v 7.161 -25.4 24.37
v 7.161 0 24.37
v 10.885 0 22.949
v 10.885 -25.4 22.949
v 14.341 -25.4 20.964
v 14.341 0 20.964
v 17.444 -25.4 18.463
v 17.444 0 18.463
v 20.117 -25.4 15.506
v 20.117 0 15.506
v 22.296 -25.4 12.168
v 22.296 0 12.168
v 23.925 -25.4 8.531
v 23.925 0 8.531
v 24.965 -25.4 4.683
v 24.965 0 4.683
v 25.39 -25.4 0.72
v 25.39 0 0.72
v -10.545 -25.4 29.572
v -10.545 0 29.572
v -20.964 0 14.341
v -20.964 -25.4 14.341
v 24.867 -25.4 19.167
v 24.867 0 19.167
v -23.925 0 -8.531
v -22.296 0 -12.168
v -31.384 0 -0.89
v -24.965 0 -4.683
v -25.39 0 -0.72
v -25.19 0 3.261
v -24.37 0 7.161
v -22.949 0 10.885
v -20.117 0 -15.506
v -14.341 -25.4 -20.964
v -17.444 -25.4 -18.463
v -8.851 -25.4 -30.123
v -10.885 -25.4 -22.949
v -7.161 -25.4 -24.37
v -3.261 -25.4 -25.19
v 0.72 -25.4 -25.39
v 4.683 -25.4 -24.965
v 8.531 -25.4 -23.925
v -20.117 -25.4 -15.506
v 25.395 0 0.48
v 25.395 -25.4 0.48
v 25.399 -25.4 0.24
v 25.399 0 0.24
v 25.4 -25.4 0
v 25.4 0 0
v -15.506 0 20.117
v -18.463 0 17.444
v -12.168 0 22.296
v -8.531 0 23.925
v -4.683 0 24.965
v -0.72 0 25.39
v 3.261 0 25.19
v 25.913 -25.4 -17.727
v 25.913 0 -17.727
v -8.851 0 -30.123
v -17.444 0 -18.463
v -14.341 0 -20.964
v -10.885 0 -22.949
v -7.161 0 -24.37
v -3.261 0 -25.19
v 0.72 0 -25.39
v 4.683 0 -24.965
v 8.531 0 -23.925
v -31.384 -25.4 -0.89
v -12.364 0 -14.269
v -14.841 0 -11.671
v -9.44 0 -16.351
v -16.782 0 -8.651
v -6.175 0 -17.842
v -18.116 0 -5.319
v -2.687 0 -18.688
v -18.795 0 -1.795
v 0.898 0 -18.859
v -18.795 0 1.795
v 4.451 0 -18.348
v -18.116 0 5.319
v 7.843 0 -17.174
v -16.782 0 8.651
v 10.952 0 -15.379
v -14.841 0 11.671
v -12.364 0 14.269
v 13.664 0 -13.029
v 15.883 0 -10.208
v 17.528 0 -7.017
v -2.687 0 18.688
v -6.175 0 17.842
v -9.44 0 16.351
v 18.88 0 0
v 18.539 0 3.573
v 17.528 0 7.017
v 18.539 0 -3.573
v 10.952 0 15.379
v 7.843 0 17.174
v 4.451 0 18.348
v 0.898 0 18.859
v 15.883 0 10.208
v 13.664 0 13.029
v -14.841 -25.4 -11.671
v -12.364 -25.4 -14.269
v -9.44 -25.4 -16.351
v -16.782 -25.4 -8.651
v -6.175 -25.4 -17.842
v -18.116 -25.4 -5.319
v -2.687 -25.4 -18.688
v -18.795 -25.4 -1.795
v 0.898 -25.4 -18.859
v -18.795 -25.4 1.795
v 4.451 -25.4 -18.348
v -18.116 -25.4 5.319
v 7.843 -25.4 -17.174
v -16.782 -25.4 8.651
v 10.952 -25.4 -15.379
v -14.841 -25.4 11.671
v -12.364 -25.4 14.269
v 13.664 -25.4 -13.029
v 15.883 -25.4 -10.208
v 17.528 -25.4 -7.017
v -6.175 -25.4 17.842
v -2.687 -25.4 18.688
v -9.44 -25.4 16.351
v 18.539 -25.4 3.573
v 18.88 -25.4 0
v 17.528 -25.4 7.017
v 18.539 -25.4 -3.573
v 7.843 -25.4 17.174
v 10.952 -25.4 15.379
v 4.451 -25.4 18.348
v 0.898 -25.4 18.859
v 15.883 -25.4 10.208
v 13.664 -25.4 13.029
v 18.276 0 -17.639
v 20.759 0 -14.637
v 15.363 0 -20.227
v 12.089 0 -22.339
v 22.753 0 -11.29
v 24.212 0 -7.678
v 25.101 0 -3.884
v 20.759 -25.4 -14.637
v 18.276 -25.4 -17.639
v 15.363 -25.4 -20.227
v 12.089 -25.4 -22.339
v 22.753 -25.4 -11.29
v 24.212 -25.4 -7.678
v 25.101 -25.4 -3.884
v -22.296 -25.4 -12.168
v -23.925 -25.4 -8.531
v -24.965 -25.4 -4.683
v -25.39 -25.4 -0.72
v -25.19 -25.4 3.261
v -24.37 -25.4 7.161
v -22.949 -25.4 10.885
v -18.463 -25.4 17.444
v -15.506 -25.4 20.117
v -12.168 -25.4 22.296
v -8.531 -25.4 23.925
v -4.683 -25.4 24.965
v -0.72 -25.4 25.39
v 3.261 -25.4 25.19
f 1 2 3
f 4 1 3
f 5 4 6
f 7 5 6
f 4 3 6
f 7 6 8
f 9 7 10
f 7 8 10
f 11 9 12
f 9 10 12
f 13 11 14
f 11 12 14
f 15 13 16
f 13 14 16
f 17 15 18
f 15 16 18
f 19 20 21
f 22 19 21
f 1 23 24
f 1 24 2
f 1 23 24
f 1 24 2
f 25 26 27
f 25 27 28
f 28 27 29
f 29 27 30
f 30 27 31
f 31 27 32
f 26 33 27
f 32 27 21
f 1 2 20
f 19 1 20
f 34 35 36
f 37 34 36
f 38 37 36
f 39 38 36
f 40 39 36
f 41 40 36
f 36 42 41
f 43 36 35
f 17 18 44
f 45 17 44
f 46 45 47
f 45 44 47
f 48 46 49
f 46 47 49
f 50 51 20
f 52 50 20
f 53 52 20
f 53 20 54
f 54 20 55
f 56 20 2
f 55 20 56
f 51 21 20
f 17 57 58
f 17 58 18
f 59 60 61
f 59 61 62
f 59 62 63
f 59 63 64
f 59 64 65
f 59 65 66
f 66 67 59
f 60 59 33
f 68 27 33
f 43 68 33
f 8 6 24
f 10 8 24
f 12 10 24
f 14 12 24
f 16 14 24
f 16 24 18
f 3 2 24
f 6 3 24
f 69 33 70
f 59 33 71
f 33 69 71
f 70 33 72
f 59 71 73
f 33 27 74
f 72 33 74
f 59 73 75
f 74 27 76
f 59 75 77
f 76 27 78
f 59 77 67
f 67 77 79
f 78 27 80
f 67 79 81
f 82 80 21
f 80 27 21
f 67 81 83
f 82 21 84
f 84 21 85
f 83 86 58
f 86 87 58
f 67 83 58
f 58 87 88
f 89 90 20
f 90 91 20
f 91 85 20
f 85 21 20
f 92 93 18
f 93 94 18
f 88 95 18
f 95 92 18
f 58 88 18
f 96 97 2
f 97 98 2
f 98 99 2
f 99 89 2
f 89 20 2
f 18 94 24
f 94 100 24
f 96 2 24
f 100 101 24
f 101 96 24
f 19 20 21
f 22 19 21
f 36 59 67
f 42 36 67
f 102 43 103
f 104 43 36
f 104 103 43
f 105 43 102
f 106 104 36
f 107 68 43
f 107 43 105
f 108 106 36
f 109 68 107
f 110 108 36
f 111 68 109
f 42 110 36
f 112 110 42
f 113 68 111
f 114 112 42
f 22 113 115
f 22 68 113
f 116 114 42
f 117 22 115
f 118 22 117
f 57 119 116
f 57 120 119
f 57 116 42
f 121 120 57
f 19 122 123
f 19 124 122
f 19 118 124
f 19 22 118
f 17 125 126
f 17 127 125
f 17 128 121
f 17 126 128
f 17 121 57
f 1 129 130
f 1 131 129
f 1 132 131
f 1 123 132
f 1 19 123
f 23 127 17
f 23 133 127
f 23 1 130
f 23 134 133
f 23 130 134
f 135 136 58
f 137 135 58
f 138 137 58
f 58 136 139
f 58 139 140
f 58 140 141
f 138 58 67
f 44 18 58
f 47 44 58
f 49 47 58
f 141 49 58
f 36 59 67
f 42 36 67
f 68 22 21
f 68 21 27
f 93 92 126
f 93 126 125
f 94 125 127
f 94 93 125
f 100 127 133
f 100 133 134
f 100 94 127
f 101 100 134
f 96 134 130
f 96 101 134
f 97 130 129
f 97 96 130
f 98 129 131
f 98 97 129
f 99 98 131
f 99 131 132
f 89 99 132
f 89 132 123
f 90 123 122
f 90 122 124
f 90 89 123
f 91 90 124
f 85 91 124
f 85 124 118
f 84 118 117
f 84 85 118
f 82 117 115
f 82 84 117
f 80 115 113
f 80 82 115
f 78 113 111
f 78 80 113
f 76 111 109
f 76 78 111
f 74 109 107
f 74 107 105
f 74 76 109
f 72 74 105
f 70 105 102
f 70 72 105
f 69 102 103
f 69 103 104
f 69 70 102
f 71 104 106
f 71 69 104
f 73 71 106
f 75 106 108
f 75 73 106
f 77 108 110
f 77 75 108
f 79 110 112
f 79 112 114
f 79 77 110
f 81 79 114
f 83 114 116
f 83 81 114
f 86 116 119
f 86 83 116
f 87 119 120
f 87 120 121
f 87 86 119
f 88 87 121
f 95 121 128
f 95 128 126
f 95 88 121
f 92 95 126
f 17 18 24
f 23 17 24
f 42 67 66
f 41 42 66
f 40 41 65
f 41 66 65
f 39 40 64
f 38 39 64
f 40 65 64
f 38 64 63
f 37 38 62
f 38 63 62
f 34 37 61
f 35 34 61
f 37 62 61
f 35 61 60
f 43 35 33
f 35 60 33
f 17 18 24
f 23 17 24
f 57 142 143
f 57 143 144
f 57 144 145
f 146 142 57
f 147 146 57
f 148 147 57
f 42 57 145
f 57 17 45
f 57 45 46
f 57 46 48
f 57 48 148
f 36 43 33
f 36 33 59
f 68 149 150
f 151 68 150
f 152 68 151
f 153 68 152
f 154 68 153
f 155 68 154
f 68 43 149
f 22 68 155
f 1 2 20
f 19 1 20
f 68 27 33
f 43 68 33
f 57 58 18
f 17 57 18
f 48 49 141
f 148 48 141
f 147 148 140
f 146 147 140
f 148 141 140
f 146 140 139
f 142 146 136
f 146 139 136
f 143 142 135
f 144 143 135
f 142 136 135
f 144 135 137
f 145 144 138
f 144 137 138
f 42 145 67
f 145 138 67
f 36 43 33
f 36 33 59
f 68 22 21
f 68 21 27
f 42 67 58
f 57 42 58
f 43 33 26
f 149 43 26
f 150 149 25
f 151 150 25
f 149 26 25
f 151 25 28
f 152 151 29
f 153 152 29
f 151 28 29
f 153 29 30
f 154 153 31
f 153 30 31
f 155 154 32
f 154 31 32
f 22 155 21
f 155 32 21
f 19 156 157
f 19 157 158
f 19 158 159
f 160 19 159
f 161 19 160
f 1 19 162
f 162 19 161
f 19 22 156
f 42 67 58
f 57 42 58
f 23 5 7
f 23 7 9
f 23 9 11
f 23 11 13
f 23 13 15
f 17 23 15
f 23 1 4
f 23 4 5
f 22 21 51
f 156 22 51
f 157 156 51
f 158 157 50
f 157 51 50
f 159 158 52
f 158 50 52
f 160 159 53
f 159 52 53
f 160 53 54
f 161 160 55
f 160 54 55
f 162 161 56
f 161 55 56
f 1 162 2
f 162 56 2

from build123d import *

# Parameters (mm, degrees)
F1_DEPTH = 25.4
F0_R     = 18.8803746014
F2_DEPTH = 25.4


with BuildPart() as f1:
    # F0 (on Front) → F1 (new body)
    with BuildSketch(Plane.XZ):
        with BuildLine():
            ThreePointArc((7.1609582992, 24.3696671343), (20.1174678851, 15.5063692041), (25.3897885366, 0.7201653034))
            Line((25.3897885366, 0.7201653034), (24.8665577157, 19.1669265832))
            Line((24.8665577157, 19.1669265832), (7.1609582992, 24.3696671343))
        make_face()
    extrude(amount=F1_DEPTH)


with BuildPart() as f1b:
    # F0 (on Front) → F1, piece 2 (new body)
    with BuildSketch(Plane.XZ):
        with BuildLine():
            ThreePointArc((-20.9640729468, 14.3411173024), (-8.5307940091, 23.9245805308), (7.1609582992, 24.3696671343))
            Line((7.1609582992, 24.3696671343), (-10.5446414986, 29.5724077975))
            Line((-10.5446414986, 29.5724077975), (-20.9640729468, 14.3411173024))
        make_face()
    extrude(amount=F1_DEPTH)


with BuildPart() as f1c:
    # F0 (on Front) → F1, piece 3 (new body)
    with BuildSketch(Plane.XZ):
        with BuildLine():
            Line((-31.383504561, -0.8901734352), (-20.1174677641, -15.506369361))
            ThreePointArc((-20.1174677641, -15.506369361), (-25.3897885345, -0.7201653795), (-20.9640729468, 14.3411173024))
            Line((-20.9640729468, 14.3411173024), (-31.383504561, -0.8901734352))
        make_face()
    extrude(amount=F1_DEPTH)


with BuildPart() as f1d:
    # F0 (on Front) → F1, piece 4 (new body)
    with BuildSketch(Plane.XZ):
        with BuildLine():
            Line((-8.8514310062, -30.1225652363), (8.530796239, -23.9245797357))
            ThreePointArc((8.530796239, -23.9245797357), (-7.1609570405, -24.3696675042), (-20.1174677641, -15.506369361))
            Line((-20.1174677641, -15.506369361), (-8.8514310062, -30.1225652363))
        make_face()
    extrude(amount=F1_DEPTH)


with BuildPart() as f1e:
    # F0 (on Front) → F1, piece 5 (new body)
    with BuildSketch(Plane.XZ):
        with BuildLine():
            ThreePointArc((25.3897885366, 0.7201653034), (25.3974470059, 0.3601188478), (25.4, 0))
            ThreePointArc((25.4, 0), (20.7586394601, -14.6369015766), (8.530796239, -23.9245797357))
            Line((8.530796239, -23.9245797357), (25.91301935, -17.7265957092))
            Line((25.91301935, -17.7265957092), (25.3897885366, 0.7201653034))
        make_face()
    extrude(amount=F1_DEPTH)


with BuildPart() as f2:
    # F0 (on Front) → F2 (new body)
    with BuildSketch(Plane.XZ):
        with BuildLine():
            ThreePointArc((8.530796239, -23.9245797357), (20.7586394601, -14.6369015766), (25.4, 0))
            ThreePointArc((25.4, 0), (25.3974470059, 0.3601188478), (25.3897885366, 0.7201653034))
            ThreePointArc((25.3897885366, 0.7201653034), (20.1174678851, 15.5063692041), (7.1609582992, 24.3696671343))
            ThreePointArc((7.1609582992, 24.3696671343), (-8.5307940091, 23.9245805308), (-20.9640729468, 14.3411173024))
            ThreePointArc((-20.9640729468, 14.3411173024), (-25.3897885345, -0.7201653795), (-20.1174677641, -15.506369361))
            ThreePointArc((-20.1174677641, -15.506369361), (-7.1609570405, -24.3696675042), (8.530796239, -23.9245797357))
        make_face()
        Circle(F0_R, mode=Mode.SUBTRACT)
        with BuildLine():
            ThreePointArc((25.3897885366, 0.7201653034), (25.3974470059, 0.3601188478), (25.4, 0))
            ThreePointArc((25.4, 0), (20.7586394601, -14.6369015766), (8.530796239, -23.9245797357))
            Line((8.530796239, -23.9245797357), (25.91301935, -17.7265957092))
            Line((25.91301935, -17.7265957092), (25.3897885366, 0.7201653034))
        make_face()
        with BuildLine():
            ThreePointArc((7.1609582992, 24.3696671343), (20.1174678851, 15.5063692041), (25.3897885366, 0.7201653034))
            Line((25.3897885366, 0.7201653034), (24.8665577157, 19.1669265832))
            Line((24.8665577157, 19.1669265832), (7.1609582992, 24.3696671343))
        make_face()
        with BuildLine():
            Line((-8.8514310062, -30.1225652363), (8.530796239, -23.9245797357))
            ThreePointArc((8.530796239, -23.9245797357), (-7.1609570405, -24.3696675042), (-20.1174677641, -15.506369361))
            Line((-20.1174677641, -15.506369361), (-8.8514310062, -30.1225652363))
        make_face()
        with BuildLine():
            ThreePointArc((-20.9640729468, 14.3411173024), (-8.5307940091, 23.9245805308), (7.1609582992, 24.3696671343))
            Line((7.1609582992, 24.3696671343), (-10.5446414986, 29.5724077975))
            Line((-10.5446414986, 29.5724077975), (-20.9640729468, 14.3411173024))
        make_face()
        with BuildLine():
            Line((-31.383504561, -0.8901734352), (-20.1174677641, -15.506369361))
            ThreePointArc((-20.1174677641, -15.506369361), (-25.3897885345, -0.7201653795), (-20.9640729468, 14.3411173024))
            Line((-20.9640729468, 14.3411173024), (-31.383504561, -0.8901734352))
        make_face()
    extrude(amount=F2_DEPTH)


solid = Compound([f1.part, f1b.part, f1c.part, f1d.part, f1e.part, f2.part])
